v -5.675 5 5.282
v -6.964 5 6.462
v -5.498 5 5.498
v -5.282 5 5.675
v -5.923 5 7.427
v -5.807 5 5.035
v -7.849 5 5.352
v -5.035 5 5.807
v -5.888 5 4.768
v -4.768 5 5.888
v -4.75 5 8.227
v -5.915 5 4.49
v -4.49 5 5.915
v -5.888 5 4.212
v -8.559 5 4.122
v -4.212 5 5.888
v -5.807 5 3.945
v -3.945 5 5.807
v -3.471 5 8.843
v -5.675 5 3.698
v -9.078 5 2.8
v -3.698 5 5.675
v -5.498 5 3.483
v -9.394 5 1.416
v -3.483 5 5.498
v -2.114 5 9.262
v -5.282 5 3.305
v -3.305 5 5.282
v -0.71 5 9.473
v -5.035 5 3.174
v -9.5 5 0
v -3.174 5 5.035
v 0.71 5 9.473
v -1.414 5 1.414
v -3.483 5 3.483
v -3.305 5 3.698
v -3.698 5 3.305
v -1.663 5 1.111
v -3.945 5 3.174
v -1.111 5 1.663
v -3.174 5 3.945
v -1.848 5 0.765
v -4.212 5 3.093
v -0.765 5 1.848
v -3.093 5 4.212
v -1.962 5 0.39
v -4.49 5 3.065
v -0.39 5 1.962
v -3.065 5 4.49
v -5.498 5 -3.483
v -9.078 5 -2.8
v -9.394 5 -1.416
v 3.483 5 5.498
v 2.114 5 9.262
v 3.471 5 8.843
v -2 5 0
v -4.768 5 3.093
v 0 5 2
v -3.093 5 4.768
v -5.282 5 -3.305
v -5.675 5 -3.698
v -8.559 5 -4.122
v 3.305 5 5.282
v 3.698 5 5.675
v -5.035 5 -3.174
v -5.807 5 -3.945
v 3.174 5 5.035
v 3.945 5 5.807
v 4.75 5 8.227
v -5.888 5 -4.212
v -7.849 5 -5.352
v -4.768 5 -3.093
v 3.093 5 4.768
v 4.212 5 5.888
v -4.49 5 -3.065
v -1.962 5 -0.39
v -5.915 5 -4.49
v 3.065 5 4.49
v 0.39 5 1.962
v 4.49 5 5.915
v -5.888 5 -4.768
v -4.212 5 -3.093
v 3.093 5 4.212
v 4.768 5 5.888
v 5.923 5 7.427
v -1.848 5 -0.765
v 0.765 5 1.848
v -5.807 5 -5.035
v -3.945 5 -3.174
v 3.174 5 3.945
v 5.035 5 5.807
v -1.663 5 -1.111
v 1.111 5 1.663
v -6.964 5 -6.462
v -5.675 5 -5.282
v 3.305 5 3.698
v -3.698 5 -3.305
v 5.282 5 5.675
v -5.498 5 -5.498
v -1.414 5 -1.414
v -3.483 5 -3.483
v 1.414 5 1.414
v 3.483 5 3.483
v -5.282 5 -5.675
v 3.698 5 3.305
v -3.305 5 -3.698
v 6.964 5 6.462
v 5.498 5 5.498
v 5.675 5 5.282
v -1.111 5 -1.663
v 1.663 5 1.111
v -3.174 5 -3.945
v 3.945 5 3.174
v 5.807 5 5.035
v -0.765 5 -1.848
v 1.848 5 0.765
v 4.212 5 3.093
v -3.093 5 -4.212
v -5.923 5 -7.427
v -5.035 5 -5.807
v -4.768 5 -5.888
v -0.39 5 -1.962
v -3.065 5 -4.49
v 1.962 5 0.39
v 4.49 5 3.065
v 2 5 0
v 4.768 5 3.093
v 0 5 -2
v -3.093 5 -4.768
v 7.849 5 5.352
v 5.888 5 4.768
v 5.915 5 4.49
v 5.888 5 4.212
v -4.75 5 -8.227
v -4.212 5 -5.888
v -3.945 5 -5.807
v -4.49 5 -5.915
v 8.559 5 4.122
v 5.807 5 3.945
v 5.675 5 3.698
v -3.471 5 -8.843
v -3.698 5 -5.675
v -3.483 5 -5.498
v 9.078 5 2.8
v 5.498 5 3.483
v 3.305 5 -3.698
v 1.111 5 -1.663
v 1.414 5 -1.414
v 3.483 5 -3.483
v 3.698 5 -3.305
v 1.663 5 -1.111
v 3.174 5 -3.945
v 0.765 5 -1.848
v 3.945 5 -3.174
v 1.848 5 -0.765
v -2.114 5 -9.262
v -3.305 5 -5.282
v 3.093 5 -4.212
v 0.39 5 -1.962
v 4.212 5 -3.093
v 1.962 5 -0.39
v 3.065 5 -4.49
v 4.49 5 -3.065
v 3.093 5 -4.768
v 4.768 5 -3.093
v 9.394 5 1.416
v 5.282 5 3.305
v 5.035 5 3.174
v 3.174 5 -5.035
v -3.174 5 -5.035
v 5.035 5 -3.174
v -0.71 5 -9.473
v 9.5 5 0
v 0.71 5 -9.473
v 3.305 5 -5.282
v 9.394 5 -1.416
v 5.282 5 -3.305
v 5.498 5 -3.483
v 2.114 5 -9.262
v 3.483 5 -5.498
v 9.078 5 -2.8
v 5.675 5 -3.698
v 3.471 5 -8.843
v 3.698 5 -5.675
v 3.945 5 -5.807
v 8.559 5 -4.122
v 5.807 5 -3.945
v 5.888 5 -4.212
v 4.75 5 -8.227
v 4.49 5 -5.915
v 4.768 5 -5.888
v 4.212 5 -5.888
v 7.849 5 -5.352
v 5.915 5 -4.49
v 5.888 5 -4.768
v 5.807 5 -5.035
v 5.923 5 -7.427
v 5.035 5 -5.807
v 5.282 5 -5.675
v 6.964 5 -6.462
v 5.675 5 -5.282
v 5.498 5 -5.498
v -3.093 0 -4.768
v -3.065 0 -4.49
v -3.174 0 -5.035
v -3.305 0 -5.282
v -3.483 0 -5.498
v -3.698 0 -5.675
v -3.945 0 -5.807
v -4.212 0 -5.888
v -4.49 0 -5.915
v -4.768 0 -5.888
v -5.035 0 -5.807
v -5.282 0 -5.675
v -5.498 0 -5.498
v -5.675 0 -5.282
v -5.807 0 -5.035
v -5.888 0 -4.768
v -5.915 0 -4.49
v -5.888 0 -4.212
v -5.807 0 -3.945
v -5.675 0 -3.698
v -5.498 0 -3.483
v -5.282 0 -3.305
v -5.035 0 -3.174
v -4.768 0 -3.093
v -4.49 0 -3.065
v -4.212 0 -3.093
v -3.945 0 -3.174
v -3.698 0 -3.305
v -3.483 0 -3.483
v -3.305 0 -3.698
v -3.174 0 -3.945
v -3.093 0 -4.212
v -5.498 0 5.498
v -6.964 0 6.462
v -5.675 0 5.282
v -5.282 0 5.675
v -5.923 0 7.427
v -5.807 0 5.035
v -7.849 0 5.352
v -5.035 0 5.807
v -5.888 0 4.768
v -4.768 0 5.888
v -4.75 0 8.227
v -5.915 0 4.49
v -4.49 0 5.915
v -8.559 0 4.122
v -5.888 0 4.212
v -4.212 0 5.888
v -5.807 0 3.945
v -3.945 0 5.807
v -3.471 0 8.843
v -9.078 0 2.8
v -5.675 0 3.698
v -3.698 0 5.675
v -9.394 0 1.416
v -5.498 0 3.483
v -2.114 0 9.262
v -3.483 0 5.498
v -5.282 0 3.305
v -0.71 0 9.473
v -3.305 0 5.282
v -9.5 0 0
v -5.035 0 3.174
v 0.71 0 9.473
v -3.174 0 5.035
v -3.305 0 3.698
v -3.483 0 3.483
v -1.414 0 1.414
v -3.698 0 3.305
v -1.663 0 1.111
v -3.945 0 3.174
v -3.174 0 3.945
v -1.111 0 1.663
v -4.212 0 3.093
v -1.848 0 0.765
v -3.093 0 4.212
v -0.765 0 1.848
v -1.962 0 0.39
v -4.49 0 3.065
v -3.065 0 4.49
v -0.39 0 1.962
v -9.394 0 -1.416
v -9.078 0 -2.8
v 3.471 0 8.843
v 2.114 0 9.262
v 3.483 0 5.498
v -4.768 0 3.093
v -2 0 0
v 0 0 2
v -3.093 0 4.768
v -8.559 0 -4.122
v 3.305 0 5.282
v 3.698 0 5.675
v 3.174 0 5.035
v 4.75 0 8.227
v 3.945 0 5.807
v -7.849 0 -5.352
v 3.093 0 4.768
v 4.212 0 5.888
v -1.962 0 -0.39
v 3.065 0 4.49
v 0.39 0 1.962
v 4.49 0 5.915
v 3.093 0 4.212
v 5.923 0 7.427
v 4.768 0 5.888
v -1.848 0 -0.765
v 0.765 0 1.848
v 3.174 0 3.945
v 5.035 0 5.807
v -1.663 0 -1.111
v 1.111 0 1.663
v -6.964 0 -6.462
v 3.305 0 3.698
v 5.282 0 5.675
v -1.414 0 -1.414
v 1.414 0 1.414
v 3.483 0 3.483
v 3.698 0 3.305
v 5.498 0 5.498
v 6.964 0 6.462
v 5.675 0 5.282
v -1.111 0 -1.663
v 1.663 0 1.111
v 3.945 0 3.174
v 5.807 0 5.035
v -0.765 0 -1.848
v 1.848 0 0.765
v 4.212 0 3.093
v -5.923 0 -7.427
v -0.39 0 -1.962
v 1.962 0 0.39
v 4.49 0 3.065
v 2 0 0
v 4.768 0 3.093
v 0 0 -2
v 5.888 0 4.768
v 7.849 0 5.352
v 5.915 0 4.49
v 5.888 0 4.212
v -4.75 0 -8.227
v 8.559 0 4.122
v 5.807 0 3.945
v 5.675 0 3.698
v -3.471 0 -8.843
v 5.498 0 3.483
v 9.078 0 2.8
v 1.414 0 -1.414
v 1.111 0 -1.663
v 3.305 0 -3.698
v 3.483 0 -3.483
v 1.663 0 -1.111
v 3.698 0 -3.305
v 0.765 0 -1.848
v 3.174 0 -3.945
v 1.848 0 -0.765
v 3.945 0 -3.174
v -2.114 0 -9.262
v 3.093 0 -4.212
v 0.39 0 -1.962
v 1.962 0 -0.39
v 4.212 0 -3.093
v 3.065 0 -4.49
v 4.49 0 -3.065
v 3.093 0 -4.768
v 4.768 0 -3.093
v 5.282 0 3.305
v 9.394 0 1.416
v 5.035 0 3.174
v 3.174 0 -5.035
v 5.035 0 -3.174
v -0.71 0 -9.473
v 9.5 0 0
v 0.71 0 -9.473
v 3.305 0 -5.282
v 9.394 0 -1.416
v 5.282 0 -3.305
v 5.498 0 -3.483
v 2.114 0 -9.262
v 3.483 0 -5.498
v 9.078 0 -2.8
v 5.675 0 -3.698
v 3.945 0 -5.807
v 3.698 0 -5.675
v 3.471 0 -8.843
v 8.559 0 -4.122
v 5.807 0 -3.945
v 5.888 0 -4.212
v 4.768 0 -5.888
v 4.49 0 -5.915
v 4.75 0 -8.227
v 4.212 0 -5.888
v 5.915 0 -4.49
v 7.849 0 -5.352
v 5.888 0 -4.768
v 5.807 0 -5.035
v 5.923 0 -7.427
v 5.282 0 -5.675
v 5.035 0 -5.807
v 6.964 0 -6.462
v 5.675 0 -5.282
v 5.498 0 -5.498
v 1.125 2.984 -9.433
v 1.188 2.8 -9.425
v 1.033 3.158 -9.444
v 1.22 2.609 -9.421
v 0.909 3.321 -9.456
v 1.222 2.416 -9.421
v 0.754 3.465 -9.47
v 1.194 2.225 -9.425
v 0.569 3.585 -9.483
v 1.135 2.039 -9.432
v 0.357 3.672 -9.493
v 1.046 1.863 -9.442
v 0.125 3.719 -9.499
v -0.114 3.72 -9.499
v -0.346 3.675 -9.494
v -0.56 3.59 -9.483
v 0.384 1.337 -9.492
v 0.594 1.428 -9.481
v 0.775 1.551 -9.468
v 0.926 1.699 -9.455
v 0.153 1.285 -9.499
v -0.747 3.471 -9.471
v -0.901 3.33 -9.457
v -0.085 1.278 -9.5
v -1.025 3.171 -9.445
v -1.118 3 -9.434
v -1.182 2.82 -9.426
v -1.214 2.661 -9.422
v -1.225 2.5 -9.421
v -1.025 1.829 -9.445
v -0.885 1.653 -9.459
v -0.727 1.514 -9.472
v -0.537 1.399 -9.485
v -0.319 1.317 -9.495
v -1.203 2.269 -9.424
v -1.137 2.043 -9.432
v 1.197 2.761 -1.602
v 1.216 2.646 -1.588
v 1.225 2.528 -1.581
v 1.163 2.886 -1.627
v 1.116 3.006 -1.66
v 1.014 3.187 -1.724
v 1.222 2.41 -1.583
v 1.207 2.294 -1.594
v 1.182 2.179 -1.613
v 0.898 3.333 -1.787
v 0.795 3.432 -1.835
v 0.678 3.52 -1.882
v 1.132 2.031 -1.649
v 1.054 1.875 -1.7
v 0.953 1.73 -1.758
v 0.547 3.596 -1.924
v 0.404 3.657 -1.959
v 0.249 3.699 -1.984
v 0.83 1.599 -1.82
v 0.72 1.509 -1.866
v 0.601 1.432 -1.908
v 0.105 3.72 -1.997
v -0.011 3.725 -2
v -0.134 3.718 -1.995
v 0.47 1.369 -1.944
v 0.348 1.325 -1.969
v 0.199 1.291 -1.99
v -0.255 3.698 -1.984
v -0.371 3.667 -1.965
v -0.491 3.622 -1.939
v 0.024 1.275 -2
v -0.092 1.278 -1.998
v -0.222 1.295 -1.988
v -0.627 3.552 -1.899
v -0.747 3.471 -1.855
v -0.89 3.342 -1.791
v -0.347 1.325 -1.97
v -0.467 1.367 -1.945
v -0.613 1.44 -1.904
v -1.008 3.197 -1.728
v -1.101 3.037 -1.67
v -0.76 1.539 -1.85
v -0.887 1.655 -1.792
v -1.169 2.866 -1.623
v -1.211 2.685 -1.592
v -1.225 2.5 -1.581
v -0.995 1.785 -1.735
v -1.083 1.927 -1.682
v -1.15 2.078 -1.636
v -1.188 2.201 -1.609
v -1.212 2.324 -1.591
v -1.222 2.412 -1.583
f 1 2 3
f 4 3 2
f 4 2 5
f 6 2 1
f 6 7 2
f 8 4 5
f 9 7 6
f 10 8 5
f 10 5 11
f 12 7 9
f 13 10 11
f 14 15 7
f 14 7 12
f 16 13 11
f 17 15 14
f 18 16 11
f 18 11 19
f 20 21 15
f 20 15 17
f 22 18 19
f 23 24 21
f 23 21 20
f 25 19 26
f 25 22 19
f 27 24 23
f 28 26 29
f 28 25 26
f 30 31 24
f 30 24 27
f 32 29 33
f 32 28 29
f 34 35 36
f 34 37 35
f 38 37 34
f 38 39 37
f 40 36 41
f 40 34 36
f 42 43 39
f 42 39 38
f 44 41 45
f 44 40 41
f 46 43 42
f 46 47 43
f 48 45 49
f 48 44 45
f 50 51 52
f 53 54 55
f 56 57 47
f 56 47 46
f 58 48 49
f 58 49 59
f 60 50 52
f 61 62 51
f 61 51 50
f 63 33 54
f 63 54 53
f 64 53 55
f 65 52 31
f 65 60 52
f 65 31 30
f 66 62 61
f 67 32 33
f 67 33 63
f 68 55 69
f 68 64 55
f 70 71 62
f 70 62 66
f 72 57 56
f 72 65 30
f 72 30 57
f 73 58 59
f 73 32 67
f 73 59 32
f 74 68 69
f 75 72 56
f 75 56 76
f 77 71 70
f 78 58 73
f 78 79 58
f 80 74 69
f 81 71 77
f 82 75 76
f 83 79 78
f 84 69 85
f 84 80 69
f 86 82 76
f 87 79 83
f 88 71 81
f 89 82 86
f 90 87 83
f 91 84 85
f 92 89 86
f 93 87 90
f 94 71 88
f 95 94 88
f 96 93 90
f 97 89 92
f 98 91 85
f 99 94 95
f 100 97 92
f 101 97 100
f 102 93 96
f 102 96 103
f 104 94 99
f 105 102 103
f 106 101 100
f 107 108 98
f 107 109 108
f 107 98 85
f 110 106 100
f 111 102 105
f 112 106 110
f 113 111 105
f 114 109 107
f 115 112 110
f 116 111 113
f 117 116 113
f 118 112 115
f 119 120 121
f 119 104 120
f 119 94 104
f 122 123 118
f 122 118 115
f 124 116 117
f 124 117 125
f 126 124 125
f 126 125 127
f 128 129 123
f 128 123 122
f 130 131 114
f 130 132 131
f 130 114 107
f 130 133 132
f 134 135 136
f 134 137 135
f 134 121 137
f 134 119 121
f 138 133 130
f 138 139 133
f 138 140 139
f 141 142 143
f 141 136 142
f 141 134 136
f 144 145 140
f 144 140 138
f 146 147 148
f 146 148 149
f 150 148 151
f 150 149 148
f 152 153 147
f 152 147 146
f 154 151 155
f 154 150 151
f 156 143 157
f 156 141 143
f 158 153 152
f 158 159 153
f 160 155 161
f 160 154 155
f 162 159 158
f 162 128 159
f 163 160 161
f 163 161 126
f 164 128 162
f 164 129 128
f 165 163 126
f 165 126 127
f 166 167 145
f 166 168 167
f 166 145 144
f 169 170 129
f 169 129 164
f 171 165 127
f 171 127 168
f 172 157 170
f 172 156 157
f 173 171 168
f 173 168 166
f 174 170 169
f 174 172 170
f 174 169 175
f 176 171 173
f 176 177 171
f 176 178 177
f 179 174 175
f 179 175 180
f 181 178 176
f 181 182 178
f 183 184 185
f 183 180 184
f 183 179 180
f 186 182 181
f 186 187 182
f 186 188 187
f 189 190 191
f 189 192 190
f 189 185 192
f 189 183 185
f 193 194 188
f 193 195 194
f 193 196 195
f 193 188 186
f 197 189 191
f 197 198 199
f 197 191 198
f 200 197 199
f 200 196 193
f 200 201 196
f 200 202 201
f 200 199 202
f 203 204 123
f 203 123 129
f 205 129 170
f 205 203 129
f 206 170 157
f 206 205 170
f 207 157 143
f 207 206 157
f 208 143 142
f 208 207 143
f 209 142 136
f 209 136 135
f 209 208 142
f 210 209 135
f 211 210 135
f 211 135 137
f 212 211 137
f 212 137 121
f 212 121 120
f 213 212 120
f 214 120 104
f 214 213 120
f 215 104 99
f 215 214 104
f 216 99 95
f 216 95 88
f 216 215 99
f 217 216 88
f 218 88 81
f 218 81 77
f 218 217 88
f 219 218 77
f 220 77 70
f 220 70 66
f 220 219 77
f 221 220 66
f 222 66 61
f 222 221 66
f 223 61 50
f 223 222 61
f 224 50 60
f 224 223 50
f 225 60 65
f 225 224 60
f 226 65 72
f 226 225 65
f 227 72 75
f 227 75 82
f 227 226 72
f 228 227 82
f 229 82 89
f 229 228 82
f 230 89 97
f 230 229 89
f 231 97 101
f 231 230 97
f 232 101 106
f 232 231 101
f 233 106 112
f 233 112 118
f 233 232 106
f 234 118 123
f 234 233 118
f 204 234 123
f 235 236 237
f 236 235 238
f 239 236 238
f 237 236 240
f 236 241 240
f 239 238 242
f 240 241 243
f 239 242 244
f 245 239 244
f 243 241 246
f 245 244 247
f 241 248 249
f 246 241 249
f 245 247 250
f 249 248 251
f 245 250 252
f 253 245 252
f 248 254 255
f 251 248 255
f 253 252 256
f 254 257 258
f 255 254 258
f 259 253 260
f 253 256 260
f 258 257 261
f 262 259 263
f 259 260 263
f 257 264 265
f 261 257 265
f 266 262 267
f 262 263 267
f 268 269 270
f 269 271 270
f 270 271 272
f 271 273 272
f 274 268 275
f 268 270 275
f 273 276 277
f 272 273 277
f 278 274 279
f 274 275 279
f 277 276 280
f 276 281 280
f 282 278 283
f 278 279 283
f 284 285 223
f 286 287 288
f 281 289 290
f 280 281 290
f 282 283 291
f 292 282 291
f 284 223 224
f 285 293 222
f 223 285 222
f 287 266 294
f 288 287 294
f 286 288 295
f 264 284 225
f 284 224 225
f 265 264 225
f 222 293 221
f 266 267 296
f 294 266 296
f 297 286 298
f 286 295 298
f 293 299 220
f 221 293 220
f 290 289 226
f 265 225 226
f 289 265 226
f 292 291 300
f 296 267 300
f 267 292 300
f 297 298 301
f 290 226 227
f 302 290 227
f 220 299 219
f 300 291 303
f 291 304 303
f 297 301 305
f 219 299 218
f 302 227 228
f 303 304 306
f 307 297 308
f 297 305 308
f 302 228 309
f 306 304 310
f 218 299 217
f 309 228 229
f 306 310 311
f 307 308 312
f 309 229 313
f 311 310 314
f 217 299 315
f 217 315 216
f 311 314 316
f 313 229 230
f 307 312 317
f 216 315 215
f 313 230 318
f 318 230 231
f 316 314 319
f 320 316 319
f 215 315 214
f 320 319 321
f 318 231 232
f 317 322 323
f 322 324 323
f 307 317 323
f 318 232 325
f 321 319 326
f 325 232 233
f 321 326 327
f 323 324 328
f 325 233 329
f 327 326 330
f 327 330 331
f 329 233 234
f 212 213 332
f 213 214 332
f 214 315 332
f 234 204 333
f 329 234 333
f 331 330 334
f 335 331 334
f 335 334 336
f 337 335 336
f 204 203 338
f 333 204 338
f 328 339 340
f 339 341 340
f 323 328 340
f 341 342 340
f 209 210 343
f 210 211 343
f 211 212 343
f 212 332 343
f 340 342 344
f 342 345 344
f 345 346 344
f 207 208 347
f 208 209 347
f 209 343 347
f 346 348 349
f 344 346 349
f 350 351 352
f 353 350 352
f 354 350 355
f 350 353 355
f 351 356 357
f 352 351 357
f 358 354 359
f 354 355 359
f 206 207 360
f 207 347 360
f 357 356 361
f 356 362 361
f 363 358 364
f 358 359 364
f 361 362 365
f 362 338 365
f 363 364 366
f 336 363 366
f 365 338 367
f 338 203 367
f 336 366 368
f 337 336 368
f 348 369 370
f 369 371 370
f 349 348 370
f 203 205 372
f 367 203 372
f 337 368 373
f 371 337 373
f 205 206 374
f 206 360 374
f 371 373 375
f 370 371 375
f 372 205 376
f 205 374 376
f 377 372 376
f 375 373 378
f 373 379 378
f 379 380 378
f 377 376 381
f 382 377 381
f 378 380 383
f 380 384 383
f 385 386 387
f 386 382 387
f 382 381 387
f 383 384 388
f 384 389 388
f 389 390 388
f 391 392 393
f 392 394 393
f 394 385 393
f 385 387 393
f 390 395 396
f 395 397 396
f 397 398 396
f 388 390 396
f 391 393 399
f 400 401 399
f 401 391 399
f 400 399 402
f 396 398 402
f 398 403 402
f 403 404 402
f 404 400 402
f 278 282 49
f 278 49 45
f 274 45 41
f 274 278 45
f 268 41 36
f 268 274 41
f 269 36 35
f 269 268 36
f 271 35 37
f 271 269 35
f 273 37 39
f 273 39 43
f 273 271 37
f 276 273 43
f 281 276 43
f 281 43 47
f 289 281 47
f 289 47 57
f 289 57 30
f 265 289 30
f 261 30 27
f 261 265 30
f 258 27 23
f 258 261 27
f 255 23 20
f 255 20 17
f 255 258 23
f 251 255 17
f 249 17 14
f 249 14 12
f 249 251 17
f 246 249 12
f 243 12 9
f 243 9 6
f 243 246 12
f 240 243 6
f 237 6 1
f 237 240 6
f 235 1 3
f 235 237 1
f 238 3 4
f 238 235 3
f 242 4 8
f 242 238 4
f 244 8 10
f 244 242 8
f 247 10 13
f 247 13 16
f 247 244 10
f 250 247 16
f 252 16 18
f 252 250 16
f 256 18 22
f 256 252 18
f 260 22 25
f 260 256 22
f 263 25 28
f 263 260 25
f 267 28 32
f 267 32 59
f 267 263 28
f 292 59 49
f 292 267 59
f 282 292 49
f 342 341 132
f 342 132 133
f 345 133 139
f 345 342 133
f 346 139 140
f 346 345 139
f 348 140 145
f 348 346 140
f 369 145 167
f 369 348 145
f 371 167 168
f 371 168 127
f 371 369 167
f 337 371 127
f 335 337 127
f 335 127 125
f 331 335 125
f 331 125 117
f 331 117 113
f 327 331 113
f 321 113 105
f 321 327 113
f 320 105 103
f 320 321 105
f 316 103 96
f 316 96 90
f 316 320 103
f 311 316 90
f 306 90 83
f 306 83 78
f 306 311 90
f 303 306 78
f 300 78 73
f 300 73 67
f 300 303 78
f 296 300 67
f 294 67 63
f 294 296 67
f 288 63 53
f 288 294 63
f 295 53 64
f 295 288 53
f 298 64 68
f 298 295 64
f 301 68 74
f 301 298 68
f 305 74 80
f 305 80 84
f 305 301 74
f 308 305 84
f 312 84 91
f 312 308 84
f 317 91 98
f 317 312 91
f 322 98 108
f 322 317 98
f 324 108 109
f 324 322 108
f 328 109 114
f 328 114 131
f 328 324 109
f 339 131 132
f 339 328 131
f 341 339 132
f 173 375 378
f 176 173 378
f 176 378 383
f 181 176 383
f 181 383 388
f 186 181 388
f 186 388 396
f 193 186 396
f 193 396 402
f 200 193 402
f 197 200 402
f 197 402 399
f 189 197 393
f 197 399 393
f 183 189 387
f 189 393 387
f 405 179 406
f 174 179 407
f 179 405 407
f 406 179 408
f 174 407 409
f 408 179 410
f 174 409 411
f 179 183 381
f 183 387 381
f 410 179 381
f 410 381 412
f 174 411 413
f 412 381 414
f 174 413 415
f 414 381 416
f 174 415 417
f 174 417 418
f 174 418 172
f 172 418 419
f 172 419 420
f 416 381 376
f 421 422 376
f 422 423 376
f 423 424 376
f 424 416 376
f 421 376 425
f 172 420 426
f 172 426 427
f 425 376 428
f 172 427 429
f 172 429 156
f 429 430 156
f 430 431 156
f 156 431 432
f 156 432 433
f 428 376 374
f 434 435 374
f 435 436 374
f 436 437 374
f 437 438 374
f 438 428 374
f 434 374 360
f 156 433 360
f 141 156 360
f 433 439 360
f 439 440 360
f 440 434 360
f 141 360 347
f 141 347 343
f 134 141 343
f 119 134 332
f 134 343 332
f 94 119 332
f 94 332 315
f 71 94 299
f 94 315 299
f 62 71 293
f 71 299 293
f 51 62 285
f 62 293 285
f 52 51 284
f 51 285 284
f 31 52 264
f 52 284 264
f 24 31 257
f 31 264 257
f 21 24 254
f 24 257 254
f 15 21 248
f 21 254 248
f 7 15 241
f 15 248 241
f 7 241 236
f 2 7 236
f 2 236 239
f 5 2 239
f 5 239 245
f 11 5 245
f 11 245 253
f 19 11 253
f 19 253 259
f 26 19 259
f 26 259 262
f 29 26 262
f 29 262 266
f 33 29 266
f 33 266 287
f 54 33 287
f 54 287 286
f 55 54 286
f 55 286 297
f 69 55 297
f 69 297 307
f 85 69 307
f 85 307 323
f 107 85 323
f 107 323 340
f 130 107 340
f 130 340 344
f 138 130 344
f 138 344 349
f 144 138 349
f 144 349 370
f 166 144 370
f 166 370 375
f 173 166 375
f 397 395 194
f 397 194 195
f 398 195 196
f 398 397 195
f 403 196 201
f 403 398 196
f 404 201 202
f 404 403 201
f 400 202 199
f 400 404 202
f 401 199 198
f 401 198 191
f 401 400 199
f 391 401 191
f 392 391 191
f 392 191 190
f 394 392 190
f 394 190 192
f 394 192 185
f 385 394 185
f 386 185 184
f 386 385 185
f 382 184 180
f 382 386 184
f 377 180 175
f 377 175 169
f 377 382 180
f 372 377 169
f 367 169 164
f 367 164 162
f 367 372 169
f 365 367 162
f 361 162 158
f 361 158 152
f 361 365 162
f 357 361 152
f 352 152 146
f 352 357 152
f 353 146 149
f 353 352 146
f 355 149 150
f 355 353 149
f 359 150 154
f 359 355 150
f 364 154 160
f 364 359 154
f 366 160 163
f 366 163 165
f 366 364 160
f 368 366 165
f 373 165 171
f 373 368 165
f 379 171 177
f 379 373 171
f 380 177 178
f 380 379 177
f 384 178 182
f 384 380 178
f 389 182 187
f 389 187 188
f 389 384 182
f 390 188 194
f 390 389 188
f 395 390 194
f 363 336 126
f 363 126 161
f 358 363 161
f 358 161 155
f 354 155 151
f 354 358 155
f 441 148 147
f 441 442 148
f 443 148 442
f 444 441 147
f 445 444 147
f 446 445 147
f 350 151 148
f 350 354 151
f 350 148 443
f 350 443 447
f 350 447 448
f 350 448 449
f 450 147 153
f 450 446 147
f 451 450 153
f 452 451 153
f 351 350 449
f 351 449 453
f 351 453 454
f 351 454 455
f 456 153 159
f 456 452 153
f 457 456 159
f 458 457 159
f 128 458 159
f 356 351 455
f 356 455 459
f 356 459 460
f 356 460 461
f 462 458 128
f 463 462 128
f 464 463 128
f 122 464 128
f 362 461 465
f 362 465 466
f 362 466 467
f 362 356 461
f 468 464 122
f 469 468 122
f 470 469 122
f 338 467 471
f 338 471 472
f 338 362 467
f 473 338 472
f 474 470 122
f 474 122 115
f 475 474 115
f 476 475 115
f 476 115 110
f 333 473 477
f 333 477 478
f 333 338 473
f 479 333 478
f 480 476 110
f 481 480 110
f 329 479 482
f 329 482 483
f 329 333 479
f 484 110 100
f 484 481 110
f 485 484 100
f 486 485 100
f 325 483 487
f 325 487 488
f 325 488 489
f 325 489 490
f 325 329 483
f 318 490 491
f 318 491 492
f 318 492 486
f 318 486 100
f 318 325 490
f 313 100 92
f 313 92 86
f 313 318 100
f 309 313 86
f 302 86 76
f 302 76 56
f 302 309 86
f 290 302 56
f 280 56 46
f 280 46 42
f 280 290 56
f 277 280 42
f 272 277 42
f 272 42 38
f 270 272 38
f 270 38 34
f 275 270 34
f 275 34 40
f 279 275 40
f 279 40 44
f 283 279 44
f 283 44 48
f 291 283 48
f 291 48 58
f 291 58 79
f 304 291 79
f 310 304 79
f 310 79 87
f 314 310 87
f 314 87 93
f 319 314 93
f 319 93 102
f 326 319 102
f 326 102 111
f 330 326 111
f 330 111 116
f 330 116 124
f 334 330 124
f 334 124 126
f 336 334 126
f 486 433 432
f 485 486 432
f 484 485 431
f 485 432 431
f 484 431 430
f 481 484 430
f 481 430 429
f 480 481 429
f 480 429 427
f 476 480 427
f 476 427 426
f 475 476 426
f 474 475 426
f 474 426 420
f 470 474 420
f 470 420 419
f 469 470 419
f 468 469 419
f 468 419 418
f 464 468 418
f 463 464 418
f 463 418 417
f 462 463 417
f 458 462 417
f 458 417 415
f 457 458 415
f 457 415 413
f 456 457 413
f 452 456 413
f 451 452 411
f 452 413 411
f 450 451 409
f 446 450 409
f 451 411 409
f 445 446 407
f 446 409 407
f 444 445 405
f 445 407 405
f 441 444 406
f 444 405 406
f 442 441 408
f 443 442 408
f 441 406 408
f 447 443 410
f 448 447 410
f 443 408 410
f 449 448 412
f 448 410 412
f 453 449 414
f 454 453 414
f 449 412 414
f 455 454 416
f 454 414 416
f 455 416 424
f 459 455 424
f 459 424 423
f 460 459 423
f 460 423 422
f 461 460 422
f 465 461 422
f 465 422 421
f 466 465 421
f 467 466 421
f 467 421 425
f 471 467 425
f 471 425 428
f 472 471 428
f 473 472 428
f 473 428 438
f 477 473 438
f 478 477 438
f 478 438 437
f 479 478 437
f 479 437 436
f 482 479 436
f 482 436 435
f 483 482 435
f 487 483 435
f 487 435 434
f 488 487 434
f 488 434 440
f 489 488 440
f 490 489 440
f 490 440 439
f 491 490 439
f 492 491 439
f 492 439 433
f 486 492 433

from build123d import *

# Parameters (mm, degrees)
SKETCH1_R           = 9.5
SKETCH1_R_2         = 2
SKETCH1_R_3         = 1.425
BOSS_EXTRUDE1_DEPTH = 5
CUT_EXTRUDE1_REACH  = 21
SKETCH2_R           = 1.225


with BuildPart() as part:
    # Sketch1 → Boss-Extrude1 (new body)
    with BuildSketch(Plane(origin=(0, 0, 0), x_dir=(1, 0, 0), z_dir=(0, 1, 0))):
        Circle(SKETCH1_R)
        Circle(SKETCH1_R_2, mode=Mode.SUBTRACT)
        with Locations((-4.490128061, 4.490128061)):
            Circle(SKETCH1_R_3, mode=Mode.SUBTRACT)
        with Locations((4.490128061, 4.490128061)):
            Circle(SKETCH1_R_3, mode=Mode.SUBTRACT)
        with Locations((4.490128061, -4.490128061)):
            Circle(SKETCH1_R_3, mode=Mode.SUBTRACT)
        with Locations((-4.490128061, -4.490128061)):
            Circle(SKETCH1_R_3, mode=Mode.SUBTRACT)
    extrude(amount=BOSS_EXTRUDE1_DEPTH)

    # Sketch2 → Cut-Extrude1 (cut, up to next)
    with BuildSketch(Plane(origin=(0, 0, -9.5), x_dir=(-1, 0, 0), z_dir=(0, 0, -1)), mode=Mode.PRIVATE) as cut_extrude1_sk1:
        with Locations((0, 2.5)):
            Circle(SKETCH2_R)
    cut_extrude1_tool1 = extrude(cut_extrude1_sk1.sketch, amount=-CUT_EXTRUDE1_REACH, mode=Mode.PRIVATE) & part.part
    add(cut_extrude1_tool1.solids().sort_by_distance((0, 2.5, -9.5))[0], mode=Mode.SUBTRACT)


solid = part.part
